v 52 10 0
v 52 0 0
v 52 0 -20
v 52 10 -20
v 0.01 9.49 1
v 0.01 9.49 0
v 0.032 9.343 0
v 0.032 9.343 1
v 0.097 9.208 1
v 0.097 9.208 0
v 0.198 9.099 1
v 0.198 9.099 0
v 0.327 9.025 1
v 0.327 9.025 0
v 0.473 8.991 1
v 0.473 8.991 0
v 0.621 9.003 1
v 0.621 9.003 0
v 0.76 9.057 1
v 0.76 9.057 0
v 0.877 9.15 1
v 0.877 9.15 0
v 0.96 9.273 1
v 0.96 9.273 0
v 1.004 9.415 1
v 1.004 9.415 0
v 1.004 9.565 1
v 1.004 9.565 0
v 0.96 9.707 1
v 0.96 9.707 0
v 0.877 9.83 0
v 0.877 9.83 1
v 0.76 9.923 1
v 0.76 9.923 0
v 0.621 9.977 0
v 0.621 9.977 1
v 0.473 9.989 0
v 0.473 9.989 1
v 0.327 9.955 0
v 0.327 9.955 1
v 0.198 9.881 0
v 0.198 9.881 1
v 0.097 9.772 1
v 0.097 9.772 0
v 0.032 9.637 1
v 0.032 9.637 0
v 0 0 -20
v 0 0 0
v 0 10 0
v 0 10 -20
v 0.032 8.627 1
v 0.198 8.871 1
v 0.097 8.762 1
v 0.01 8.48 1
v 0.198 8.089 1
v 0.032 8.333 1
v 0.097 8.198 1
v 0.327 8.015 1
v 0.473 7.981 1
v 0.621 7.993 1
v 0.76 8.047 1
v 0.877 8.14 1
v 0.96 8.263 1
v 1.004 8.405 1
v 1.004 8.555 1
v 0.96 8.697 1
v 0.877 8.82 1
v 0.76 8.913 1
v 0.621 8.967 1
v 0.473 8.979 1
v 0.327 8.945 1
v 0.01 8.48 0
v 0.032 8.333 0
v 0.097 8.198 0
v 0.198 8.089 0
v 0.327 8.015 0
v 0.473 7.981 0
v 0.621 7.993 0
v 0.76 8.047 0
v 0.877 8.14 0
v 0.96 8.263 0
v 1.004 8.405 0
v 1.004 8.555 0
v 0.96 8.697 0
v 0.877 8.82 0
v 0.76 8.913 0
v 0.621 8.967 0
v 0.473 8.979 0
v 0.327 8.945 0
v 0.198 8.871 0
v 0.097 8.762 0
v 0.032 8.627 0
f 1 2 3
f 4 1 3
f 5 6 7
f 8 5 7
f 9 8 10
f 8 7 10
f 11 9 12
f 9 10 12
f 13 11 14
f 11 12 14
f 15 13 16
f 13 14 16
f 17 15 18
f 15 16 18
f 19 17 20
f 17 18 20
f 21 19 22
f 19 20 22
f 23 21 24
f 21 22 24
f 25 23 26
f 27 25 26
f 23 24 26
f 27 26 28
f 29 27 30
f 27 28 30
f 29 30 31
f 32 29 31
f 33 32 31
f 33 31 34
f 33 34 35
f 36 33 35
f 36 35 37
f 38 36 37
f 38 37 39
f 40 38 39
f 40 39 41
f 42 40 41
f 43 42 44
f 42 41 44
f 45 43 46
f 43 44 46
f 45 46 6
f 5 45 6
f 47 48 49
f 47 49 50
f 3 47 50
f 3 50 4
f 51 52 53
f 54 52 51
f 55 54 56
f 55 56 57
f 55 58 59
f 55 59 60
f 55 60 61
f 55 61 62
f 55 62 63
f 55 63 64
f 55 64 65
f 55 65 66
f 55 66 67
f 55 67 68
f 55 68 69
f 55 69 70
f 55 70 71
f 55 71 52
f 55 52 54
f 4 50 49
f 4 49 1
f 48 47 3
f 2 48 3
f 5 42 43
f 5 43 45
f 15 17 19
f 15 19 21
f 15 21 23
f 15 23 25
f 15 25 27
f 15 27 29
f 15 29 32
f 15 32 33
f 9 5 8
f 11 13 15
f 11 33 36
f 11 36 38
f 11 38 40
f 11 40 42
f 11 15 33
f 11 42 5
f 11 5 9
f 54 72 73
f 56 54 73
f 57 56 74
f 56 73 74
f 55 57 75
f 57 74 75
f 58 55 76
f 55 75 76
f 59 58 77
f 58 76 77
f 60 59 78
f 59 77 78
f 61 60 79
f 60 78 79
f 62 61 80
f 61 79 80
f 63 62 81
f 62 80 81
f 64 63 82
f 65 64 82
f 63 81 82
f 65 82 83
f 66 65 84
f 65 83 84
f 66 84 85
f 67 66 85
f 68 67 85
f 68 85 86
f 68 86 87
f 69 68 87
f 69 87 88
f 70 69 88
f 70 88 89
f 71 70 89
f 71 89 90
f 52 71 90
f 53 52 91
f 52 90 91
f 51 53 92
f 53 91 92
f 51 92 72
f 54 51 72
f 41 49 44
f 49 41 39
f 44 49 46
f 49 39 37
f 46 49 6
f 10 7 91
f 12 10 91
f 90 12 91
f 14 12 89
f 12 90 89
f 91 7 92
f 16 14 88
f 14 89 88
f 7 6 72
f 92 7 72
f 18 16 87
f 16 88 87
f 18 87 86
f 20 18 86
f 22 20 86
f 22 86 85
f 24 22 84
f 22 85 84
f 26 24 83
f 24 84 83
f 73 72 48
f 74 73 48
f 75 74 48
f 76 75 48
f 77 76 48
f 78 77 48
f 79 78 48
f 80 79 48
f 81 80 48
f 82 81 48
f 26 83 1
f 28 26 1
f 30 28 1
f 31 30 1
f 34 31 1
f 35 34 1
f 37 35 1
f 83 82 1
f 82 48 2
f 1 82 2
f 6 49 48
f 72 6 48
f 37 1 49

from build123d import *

# Parameters (mm, degrees)
SKETCH1_W           = 52
SKETCH1_H           = 20
BOSS_EXTRUDE1_DEPTH = 10
SKETCH3_R           = 0.5
BOSS_EXTRUDE7_DEPTH = 1


with BuildPart() as part:
    # Sketch1 → Boss-Extrude1 (new body)
    with BuildSketch(Plane(origin=(0, 0, 0), x_dir=(1, 0, 0), z_dir=(0, 1, 0))):
        with Locations((26, 10)):
            Rectangle(SKETCH1_W, SKETCH1_H)
    extrude(amount=BOSS_EXTRUDE1_DEPTH)

    # Sketch3 → Boss-Extrude7 (add)
    with BuildSketch(Plane.XY):
        with Locations(Location((0.51, 9.49, 0), (0, 0, 180))):
            Circle(SKETCH3_R)
        with Locations(Location((0.51, 8.48, 0), (0, 0, 180))):
            Circle(SKETCH3_R)
    extrude(amount=BOSS_EXTRUDE7_DEPTH)


solid = part.part
